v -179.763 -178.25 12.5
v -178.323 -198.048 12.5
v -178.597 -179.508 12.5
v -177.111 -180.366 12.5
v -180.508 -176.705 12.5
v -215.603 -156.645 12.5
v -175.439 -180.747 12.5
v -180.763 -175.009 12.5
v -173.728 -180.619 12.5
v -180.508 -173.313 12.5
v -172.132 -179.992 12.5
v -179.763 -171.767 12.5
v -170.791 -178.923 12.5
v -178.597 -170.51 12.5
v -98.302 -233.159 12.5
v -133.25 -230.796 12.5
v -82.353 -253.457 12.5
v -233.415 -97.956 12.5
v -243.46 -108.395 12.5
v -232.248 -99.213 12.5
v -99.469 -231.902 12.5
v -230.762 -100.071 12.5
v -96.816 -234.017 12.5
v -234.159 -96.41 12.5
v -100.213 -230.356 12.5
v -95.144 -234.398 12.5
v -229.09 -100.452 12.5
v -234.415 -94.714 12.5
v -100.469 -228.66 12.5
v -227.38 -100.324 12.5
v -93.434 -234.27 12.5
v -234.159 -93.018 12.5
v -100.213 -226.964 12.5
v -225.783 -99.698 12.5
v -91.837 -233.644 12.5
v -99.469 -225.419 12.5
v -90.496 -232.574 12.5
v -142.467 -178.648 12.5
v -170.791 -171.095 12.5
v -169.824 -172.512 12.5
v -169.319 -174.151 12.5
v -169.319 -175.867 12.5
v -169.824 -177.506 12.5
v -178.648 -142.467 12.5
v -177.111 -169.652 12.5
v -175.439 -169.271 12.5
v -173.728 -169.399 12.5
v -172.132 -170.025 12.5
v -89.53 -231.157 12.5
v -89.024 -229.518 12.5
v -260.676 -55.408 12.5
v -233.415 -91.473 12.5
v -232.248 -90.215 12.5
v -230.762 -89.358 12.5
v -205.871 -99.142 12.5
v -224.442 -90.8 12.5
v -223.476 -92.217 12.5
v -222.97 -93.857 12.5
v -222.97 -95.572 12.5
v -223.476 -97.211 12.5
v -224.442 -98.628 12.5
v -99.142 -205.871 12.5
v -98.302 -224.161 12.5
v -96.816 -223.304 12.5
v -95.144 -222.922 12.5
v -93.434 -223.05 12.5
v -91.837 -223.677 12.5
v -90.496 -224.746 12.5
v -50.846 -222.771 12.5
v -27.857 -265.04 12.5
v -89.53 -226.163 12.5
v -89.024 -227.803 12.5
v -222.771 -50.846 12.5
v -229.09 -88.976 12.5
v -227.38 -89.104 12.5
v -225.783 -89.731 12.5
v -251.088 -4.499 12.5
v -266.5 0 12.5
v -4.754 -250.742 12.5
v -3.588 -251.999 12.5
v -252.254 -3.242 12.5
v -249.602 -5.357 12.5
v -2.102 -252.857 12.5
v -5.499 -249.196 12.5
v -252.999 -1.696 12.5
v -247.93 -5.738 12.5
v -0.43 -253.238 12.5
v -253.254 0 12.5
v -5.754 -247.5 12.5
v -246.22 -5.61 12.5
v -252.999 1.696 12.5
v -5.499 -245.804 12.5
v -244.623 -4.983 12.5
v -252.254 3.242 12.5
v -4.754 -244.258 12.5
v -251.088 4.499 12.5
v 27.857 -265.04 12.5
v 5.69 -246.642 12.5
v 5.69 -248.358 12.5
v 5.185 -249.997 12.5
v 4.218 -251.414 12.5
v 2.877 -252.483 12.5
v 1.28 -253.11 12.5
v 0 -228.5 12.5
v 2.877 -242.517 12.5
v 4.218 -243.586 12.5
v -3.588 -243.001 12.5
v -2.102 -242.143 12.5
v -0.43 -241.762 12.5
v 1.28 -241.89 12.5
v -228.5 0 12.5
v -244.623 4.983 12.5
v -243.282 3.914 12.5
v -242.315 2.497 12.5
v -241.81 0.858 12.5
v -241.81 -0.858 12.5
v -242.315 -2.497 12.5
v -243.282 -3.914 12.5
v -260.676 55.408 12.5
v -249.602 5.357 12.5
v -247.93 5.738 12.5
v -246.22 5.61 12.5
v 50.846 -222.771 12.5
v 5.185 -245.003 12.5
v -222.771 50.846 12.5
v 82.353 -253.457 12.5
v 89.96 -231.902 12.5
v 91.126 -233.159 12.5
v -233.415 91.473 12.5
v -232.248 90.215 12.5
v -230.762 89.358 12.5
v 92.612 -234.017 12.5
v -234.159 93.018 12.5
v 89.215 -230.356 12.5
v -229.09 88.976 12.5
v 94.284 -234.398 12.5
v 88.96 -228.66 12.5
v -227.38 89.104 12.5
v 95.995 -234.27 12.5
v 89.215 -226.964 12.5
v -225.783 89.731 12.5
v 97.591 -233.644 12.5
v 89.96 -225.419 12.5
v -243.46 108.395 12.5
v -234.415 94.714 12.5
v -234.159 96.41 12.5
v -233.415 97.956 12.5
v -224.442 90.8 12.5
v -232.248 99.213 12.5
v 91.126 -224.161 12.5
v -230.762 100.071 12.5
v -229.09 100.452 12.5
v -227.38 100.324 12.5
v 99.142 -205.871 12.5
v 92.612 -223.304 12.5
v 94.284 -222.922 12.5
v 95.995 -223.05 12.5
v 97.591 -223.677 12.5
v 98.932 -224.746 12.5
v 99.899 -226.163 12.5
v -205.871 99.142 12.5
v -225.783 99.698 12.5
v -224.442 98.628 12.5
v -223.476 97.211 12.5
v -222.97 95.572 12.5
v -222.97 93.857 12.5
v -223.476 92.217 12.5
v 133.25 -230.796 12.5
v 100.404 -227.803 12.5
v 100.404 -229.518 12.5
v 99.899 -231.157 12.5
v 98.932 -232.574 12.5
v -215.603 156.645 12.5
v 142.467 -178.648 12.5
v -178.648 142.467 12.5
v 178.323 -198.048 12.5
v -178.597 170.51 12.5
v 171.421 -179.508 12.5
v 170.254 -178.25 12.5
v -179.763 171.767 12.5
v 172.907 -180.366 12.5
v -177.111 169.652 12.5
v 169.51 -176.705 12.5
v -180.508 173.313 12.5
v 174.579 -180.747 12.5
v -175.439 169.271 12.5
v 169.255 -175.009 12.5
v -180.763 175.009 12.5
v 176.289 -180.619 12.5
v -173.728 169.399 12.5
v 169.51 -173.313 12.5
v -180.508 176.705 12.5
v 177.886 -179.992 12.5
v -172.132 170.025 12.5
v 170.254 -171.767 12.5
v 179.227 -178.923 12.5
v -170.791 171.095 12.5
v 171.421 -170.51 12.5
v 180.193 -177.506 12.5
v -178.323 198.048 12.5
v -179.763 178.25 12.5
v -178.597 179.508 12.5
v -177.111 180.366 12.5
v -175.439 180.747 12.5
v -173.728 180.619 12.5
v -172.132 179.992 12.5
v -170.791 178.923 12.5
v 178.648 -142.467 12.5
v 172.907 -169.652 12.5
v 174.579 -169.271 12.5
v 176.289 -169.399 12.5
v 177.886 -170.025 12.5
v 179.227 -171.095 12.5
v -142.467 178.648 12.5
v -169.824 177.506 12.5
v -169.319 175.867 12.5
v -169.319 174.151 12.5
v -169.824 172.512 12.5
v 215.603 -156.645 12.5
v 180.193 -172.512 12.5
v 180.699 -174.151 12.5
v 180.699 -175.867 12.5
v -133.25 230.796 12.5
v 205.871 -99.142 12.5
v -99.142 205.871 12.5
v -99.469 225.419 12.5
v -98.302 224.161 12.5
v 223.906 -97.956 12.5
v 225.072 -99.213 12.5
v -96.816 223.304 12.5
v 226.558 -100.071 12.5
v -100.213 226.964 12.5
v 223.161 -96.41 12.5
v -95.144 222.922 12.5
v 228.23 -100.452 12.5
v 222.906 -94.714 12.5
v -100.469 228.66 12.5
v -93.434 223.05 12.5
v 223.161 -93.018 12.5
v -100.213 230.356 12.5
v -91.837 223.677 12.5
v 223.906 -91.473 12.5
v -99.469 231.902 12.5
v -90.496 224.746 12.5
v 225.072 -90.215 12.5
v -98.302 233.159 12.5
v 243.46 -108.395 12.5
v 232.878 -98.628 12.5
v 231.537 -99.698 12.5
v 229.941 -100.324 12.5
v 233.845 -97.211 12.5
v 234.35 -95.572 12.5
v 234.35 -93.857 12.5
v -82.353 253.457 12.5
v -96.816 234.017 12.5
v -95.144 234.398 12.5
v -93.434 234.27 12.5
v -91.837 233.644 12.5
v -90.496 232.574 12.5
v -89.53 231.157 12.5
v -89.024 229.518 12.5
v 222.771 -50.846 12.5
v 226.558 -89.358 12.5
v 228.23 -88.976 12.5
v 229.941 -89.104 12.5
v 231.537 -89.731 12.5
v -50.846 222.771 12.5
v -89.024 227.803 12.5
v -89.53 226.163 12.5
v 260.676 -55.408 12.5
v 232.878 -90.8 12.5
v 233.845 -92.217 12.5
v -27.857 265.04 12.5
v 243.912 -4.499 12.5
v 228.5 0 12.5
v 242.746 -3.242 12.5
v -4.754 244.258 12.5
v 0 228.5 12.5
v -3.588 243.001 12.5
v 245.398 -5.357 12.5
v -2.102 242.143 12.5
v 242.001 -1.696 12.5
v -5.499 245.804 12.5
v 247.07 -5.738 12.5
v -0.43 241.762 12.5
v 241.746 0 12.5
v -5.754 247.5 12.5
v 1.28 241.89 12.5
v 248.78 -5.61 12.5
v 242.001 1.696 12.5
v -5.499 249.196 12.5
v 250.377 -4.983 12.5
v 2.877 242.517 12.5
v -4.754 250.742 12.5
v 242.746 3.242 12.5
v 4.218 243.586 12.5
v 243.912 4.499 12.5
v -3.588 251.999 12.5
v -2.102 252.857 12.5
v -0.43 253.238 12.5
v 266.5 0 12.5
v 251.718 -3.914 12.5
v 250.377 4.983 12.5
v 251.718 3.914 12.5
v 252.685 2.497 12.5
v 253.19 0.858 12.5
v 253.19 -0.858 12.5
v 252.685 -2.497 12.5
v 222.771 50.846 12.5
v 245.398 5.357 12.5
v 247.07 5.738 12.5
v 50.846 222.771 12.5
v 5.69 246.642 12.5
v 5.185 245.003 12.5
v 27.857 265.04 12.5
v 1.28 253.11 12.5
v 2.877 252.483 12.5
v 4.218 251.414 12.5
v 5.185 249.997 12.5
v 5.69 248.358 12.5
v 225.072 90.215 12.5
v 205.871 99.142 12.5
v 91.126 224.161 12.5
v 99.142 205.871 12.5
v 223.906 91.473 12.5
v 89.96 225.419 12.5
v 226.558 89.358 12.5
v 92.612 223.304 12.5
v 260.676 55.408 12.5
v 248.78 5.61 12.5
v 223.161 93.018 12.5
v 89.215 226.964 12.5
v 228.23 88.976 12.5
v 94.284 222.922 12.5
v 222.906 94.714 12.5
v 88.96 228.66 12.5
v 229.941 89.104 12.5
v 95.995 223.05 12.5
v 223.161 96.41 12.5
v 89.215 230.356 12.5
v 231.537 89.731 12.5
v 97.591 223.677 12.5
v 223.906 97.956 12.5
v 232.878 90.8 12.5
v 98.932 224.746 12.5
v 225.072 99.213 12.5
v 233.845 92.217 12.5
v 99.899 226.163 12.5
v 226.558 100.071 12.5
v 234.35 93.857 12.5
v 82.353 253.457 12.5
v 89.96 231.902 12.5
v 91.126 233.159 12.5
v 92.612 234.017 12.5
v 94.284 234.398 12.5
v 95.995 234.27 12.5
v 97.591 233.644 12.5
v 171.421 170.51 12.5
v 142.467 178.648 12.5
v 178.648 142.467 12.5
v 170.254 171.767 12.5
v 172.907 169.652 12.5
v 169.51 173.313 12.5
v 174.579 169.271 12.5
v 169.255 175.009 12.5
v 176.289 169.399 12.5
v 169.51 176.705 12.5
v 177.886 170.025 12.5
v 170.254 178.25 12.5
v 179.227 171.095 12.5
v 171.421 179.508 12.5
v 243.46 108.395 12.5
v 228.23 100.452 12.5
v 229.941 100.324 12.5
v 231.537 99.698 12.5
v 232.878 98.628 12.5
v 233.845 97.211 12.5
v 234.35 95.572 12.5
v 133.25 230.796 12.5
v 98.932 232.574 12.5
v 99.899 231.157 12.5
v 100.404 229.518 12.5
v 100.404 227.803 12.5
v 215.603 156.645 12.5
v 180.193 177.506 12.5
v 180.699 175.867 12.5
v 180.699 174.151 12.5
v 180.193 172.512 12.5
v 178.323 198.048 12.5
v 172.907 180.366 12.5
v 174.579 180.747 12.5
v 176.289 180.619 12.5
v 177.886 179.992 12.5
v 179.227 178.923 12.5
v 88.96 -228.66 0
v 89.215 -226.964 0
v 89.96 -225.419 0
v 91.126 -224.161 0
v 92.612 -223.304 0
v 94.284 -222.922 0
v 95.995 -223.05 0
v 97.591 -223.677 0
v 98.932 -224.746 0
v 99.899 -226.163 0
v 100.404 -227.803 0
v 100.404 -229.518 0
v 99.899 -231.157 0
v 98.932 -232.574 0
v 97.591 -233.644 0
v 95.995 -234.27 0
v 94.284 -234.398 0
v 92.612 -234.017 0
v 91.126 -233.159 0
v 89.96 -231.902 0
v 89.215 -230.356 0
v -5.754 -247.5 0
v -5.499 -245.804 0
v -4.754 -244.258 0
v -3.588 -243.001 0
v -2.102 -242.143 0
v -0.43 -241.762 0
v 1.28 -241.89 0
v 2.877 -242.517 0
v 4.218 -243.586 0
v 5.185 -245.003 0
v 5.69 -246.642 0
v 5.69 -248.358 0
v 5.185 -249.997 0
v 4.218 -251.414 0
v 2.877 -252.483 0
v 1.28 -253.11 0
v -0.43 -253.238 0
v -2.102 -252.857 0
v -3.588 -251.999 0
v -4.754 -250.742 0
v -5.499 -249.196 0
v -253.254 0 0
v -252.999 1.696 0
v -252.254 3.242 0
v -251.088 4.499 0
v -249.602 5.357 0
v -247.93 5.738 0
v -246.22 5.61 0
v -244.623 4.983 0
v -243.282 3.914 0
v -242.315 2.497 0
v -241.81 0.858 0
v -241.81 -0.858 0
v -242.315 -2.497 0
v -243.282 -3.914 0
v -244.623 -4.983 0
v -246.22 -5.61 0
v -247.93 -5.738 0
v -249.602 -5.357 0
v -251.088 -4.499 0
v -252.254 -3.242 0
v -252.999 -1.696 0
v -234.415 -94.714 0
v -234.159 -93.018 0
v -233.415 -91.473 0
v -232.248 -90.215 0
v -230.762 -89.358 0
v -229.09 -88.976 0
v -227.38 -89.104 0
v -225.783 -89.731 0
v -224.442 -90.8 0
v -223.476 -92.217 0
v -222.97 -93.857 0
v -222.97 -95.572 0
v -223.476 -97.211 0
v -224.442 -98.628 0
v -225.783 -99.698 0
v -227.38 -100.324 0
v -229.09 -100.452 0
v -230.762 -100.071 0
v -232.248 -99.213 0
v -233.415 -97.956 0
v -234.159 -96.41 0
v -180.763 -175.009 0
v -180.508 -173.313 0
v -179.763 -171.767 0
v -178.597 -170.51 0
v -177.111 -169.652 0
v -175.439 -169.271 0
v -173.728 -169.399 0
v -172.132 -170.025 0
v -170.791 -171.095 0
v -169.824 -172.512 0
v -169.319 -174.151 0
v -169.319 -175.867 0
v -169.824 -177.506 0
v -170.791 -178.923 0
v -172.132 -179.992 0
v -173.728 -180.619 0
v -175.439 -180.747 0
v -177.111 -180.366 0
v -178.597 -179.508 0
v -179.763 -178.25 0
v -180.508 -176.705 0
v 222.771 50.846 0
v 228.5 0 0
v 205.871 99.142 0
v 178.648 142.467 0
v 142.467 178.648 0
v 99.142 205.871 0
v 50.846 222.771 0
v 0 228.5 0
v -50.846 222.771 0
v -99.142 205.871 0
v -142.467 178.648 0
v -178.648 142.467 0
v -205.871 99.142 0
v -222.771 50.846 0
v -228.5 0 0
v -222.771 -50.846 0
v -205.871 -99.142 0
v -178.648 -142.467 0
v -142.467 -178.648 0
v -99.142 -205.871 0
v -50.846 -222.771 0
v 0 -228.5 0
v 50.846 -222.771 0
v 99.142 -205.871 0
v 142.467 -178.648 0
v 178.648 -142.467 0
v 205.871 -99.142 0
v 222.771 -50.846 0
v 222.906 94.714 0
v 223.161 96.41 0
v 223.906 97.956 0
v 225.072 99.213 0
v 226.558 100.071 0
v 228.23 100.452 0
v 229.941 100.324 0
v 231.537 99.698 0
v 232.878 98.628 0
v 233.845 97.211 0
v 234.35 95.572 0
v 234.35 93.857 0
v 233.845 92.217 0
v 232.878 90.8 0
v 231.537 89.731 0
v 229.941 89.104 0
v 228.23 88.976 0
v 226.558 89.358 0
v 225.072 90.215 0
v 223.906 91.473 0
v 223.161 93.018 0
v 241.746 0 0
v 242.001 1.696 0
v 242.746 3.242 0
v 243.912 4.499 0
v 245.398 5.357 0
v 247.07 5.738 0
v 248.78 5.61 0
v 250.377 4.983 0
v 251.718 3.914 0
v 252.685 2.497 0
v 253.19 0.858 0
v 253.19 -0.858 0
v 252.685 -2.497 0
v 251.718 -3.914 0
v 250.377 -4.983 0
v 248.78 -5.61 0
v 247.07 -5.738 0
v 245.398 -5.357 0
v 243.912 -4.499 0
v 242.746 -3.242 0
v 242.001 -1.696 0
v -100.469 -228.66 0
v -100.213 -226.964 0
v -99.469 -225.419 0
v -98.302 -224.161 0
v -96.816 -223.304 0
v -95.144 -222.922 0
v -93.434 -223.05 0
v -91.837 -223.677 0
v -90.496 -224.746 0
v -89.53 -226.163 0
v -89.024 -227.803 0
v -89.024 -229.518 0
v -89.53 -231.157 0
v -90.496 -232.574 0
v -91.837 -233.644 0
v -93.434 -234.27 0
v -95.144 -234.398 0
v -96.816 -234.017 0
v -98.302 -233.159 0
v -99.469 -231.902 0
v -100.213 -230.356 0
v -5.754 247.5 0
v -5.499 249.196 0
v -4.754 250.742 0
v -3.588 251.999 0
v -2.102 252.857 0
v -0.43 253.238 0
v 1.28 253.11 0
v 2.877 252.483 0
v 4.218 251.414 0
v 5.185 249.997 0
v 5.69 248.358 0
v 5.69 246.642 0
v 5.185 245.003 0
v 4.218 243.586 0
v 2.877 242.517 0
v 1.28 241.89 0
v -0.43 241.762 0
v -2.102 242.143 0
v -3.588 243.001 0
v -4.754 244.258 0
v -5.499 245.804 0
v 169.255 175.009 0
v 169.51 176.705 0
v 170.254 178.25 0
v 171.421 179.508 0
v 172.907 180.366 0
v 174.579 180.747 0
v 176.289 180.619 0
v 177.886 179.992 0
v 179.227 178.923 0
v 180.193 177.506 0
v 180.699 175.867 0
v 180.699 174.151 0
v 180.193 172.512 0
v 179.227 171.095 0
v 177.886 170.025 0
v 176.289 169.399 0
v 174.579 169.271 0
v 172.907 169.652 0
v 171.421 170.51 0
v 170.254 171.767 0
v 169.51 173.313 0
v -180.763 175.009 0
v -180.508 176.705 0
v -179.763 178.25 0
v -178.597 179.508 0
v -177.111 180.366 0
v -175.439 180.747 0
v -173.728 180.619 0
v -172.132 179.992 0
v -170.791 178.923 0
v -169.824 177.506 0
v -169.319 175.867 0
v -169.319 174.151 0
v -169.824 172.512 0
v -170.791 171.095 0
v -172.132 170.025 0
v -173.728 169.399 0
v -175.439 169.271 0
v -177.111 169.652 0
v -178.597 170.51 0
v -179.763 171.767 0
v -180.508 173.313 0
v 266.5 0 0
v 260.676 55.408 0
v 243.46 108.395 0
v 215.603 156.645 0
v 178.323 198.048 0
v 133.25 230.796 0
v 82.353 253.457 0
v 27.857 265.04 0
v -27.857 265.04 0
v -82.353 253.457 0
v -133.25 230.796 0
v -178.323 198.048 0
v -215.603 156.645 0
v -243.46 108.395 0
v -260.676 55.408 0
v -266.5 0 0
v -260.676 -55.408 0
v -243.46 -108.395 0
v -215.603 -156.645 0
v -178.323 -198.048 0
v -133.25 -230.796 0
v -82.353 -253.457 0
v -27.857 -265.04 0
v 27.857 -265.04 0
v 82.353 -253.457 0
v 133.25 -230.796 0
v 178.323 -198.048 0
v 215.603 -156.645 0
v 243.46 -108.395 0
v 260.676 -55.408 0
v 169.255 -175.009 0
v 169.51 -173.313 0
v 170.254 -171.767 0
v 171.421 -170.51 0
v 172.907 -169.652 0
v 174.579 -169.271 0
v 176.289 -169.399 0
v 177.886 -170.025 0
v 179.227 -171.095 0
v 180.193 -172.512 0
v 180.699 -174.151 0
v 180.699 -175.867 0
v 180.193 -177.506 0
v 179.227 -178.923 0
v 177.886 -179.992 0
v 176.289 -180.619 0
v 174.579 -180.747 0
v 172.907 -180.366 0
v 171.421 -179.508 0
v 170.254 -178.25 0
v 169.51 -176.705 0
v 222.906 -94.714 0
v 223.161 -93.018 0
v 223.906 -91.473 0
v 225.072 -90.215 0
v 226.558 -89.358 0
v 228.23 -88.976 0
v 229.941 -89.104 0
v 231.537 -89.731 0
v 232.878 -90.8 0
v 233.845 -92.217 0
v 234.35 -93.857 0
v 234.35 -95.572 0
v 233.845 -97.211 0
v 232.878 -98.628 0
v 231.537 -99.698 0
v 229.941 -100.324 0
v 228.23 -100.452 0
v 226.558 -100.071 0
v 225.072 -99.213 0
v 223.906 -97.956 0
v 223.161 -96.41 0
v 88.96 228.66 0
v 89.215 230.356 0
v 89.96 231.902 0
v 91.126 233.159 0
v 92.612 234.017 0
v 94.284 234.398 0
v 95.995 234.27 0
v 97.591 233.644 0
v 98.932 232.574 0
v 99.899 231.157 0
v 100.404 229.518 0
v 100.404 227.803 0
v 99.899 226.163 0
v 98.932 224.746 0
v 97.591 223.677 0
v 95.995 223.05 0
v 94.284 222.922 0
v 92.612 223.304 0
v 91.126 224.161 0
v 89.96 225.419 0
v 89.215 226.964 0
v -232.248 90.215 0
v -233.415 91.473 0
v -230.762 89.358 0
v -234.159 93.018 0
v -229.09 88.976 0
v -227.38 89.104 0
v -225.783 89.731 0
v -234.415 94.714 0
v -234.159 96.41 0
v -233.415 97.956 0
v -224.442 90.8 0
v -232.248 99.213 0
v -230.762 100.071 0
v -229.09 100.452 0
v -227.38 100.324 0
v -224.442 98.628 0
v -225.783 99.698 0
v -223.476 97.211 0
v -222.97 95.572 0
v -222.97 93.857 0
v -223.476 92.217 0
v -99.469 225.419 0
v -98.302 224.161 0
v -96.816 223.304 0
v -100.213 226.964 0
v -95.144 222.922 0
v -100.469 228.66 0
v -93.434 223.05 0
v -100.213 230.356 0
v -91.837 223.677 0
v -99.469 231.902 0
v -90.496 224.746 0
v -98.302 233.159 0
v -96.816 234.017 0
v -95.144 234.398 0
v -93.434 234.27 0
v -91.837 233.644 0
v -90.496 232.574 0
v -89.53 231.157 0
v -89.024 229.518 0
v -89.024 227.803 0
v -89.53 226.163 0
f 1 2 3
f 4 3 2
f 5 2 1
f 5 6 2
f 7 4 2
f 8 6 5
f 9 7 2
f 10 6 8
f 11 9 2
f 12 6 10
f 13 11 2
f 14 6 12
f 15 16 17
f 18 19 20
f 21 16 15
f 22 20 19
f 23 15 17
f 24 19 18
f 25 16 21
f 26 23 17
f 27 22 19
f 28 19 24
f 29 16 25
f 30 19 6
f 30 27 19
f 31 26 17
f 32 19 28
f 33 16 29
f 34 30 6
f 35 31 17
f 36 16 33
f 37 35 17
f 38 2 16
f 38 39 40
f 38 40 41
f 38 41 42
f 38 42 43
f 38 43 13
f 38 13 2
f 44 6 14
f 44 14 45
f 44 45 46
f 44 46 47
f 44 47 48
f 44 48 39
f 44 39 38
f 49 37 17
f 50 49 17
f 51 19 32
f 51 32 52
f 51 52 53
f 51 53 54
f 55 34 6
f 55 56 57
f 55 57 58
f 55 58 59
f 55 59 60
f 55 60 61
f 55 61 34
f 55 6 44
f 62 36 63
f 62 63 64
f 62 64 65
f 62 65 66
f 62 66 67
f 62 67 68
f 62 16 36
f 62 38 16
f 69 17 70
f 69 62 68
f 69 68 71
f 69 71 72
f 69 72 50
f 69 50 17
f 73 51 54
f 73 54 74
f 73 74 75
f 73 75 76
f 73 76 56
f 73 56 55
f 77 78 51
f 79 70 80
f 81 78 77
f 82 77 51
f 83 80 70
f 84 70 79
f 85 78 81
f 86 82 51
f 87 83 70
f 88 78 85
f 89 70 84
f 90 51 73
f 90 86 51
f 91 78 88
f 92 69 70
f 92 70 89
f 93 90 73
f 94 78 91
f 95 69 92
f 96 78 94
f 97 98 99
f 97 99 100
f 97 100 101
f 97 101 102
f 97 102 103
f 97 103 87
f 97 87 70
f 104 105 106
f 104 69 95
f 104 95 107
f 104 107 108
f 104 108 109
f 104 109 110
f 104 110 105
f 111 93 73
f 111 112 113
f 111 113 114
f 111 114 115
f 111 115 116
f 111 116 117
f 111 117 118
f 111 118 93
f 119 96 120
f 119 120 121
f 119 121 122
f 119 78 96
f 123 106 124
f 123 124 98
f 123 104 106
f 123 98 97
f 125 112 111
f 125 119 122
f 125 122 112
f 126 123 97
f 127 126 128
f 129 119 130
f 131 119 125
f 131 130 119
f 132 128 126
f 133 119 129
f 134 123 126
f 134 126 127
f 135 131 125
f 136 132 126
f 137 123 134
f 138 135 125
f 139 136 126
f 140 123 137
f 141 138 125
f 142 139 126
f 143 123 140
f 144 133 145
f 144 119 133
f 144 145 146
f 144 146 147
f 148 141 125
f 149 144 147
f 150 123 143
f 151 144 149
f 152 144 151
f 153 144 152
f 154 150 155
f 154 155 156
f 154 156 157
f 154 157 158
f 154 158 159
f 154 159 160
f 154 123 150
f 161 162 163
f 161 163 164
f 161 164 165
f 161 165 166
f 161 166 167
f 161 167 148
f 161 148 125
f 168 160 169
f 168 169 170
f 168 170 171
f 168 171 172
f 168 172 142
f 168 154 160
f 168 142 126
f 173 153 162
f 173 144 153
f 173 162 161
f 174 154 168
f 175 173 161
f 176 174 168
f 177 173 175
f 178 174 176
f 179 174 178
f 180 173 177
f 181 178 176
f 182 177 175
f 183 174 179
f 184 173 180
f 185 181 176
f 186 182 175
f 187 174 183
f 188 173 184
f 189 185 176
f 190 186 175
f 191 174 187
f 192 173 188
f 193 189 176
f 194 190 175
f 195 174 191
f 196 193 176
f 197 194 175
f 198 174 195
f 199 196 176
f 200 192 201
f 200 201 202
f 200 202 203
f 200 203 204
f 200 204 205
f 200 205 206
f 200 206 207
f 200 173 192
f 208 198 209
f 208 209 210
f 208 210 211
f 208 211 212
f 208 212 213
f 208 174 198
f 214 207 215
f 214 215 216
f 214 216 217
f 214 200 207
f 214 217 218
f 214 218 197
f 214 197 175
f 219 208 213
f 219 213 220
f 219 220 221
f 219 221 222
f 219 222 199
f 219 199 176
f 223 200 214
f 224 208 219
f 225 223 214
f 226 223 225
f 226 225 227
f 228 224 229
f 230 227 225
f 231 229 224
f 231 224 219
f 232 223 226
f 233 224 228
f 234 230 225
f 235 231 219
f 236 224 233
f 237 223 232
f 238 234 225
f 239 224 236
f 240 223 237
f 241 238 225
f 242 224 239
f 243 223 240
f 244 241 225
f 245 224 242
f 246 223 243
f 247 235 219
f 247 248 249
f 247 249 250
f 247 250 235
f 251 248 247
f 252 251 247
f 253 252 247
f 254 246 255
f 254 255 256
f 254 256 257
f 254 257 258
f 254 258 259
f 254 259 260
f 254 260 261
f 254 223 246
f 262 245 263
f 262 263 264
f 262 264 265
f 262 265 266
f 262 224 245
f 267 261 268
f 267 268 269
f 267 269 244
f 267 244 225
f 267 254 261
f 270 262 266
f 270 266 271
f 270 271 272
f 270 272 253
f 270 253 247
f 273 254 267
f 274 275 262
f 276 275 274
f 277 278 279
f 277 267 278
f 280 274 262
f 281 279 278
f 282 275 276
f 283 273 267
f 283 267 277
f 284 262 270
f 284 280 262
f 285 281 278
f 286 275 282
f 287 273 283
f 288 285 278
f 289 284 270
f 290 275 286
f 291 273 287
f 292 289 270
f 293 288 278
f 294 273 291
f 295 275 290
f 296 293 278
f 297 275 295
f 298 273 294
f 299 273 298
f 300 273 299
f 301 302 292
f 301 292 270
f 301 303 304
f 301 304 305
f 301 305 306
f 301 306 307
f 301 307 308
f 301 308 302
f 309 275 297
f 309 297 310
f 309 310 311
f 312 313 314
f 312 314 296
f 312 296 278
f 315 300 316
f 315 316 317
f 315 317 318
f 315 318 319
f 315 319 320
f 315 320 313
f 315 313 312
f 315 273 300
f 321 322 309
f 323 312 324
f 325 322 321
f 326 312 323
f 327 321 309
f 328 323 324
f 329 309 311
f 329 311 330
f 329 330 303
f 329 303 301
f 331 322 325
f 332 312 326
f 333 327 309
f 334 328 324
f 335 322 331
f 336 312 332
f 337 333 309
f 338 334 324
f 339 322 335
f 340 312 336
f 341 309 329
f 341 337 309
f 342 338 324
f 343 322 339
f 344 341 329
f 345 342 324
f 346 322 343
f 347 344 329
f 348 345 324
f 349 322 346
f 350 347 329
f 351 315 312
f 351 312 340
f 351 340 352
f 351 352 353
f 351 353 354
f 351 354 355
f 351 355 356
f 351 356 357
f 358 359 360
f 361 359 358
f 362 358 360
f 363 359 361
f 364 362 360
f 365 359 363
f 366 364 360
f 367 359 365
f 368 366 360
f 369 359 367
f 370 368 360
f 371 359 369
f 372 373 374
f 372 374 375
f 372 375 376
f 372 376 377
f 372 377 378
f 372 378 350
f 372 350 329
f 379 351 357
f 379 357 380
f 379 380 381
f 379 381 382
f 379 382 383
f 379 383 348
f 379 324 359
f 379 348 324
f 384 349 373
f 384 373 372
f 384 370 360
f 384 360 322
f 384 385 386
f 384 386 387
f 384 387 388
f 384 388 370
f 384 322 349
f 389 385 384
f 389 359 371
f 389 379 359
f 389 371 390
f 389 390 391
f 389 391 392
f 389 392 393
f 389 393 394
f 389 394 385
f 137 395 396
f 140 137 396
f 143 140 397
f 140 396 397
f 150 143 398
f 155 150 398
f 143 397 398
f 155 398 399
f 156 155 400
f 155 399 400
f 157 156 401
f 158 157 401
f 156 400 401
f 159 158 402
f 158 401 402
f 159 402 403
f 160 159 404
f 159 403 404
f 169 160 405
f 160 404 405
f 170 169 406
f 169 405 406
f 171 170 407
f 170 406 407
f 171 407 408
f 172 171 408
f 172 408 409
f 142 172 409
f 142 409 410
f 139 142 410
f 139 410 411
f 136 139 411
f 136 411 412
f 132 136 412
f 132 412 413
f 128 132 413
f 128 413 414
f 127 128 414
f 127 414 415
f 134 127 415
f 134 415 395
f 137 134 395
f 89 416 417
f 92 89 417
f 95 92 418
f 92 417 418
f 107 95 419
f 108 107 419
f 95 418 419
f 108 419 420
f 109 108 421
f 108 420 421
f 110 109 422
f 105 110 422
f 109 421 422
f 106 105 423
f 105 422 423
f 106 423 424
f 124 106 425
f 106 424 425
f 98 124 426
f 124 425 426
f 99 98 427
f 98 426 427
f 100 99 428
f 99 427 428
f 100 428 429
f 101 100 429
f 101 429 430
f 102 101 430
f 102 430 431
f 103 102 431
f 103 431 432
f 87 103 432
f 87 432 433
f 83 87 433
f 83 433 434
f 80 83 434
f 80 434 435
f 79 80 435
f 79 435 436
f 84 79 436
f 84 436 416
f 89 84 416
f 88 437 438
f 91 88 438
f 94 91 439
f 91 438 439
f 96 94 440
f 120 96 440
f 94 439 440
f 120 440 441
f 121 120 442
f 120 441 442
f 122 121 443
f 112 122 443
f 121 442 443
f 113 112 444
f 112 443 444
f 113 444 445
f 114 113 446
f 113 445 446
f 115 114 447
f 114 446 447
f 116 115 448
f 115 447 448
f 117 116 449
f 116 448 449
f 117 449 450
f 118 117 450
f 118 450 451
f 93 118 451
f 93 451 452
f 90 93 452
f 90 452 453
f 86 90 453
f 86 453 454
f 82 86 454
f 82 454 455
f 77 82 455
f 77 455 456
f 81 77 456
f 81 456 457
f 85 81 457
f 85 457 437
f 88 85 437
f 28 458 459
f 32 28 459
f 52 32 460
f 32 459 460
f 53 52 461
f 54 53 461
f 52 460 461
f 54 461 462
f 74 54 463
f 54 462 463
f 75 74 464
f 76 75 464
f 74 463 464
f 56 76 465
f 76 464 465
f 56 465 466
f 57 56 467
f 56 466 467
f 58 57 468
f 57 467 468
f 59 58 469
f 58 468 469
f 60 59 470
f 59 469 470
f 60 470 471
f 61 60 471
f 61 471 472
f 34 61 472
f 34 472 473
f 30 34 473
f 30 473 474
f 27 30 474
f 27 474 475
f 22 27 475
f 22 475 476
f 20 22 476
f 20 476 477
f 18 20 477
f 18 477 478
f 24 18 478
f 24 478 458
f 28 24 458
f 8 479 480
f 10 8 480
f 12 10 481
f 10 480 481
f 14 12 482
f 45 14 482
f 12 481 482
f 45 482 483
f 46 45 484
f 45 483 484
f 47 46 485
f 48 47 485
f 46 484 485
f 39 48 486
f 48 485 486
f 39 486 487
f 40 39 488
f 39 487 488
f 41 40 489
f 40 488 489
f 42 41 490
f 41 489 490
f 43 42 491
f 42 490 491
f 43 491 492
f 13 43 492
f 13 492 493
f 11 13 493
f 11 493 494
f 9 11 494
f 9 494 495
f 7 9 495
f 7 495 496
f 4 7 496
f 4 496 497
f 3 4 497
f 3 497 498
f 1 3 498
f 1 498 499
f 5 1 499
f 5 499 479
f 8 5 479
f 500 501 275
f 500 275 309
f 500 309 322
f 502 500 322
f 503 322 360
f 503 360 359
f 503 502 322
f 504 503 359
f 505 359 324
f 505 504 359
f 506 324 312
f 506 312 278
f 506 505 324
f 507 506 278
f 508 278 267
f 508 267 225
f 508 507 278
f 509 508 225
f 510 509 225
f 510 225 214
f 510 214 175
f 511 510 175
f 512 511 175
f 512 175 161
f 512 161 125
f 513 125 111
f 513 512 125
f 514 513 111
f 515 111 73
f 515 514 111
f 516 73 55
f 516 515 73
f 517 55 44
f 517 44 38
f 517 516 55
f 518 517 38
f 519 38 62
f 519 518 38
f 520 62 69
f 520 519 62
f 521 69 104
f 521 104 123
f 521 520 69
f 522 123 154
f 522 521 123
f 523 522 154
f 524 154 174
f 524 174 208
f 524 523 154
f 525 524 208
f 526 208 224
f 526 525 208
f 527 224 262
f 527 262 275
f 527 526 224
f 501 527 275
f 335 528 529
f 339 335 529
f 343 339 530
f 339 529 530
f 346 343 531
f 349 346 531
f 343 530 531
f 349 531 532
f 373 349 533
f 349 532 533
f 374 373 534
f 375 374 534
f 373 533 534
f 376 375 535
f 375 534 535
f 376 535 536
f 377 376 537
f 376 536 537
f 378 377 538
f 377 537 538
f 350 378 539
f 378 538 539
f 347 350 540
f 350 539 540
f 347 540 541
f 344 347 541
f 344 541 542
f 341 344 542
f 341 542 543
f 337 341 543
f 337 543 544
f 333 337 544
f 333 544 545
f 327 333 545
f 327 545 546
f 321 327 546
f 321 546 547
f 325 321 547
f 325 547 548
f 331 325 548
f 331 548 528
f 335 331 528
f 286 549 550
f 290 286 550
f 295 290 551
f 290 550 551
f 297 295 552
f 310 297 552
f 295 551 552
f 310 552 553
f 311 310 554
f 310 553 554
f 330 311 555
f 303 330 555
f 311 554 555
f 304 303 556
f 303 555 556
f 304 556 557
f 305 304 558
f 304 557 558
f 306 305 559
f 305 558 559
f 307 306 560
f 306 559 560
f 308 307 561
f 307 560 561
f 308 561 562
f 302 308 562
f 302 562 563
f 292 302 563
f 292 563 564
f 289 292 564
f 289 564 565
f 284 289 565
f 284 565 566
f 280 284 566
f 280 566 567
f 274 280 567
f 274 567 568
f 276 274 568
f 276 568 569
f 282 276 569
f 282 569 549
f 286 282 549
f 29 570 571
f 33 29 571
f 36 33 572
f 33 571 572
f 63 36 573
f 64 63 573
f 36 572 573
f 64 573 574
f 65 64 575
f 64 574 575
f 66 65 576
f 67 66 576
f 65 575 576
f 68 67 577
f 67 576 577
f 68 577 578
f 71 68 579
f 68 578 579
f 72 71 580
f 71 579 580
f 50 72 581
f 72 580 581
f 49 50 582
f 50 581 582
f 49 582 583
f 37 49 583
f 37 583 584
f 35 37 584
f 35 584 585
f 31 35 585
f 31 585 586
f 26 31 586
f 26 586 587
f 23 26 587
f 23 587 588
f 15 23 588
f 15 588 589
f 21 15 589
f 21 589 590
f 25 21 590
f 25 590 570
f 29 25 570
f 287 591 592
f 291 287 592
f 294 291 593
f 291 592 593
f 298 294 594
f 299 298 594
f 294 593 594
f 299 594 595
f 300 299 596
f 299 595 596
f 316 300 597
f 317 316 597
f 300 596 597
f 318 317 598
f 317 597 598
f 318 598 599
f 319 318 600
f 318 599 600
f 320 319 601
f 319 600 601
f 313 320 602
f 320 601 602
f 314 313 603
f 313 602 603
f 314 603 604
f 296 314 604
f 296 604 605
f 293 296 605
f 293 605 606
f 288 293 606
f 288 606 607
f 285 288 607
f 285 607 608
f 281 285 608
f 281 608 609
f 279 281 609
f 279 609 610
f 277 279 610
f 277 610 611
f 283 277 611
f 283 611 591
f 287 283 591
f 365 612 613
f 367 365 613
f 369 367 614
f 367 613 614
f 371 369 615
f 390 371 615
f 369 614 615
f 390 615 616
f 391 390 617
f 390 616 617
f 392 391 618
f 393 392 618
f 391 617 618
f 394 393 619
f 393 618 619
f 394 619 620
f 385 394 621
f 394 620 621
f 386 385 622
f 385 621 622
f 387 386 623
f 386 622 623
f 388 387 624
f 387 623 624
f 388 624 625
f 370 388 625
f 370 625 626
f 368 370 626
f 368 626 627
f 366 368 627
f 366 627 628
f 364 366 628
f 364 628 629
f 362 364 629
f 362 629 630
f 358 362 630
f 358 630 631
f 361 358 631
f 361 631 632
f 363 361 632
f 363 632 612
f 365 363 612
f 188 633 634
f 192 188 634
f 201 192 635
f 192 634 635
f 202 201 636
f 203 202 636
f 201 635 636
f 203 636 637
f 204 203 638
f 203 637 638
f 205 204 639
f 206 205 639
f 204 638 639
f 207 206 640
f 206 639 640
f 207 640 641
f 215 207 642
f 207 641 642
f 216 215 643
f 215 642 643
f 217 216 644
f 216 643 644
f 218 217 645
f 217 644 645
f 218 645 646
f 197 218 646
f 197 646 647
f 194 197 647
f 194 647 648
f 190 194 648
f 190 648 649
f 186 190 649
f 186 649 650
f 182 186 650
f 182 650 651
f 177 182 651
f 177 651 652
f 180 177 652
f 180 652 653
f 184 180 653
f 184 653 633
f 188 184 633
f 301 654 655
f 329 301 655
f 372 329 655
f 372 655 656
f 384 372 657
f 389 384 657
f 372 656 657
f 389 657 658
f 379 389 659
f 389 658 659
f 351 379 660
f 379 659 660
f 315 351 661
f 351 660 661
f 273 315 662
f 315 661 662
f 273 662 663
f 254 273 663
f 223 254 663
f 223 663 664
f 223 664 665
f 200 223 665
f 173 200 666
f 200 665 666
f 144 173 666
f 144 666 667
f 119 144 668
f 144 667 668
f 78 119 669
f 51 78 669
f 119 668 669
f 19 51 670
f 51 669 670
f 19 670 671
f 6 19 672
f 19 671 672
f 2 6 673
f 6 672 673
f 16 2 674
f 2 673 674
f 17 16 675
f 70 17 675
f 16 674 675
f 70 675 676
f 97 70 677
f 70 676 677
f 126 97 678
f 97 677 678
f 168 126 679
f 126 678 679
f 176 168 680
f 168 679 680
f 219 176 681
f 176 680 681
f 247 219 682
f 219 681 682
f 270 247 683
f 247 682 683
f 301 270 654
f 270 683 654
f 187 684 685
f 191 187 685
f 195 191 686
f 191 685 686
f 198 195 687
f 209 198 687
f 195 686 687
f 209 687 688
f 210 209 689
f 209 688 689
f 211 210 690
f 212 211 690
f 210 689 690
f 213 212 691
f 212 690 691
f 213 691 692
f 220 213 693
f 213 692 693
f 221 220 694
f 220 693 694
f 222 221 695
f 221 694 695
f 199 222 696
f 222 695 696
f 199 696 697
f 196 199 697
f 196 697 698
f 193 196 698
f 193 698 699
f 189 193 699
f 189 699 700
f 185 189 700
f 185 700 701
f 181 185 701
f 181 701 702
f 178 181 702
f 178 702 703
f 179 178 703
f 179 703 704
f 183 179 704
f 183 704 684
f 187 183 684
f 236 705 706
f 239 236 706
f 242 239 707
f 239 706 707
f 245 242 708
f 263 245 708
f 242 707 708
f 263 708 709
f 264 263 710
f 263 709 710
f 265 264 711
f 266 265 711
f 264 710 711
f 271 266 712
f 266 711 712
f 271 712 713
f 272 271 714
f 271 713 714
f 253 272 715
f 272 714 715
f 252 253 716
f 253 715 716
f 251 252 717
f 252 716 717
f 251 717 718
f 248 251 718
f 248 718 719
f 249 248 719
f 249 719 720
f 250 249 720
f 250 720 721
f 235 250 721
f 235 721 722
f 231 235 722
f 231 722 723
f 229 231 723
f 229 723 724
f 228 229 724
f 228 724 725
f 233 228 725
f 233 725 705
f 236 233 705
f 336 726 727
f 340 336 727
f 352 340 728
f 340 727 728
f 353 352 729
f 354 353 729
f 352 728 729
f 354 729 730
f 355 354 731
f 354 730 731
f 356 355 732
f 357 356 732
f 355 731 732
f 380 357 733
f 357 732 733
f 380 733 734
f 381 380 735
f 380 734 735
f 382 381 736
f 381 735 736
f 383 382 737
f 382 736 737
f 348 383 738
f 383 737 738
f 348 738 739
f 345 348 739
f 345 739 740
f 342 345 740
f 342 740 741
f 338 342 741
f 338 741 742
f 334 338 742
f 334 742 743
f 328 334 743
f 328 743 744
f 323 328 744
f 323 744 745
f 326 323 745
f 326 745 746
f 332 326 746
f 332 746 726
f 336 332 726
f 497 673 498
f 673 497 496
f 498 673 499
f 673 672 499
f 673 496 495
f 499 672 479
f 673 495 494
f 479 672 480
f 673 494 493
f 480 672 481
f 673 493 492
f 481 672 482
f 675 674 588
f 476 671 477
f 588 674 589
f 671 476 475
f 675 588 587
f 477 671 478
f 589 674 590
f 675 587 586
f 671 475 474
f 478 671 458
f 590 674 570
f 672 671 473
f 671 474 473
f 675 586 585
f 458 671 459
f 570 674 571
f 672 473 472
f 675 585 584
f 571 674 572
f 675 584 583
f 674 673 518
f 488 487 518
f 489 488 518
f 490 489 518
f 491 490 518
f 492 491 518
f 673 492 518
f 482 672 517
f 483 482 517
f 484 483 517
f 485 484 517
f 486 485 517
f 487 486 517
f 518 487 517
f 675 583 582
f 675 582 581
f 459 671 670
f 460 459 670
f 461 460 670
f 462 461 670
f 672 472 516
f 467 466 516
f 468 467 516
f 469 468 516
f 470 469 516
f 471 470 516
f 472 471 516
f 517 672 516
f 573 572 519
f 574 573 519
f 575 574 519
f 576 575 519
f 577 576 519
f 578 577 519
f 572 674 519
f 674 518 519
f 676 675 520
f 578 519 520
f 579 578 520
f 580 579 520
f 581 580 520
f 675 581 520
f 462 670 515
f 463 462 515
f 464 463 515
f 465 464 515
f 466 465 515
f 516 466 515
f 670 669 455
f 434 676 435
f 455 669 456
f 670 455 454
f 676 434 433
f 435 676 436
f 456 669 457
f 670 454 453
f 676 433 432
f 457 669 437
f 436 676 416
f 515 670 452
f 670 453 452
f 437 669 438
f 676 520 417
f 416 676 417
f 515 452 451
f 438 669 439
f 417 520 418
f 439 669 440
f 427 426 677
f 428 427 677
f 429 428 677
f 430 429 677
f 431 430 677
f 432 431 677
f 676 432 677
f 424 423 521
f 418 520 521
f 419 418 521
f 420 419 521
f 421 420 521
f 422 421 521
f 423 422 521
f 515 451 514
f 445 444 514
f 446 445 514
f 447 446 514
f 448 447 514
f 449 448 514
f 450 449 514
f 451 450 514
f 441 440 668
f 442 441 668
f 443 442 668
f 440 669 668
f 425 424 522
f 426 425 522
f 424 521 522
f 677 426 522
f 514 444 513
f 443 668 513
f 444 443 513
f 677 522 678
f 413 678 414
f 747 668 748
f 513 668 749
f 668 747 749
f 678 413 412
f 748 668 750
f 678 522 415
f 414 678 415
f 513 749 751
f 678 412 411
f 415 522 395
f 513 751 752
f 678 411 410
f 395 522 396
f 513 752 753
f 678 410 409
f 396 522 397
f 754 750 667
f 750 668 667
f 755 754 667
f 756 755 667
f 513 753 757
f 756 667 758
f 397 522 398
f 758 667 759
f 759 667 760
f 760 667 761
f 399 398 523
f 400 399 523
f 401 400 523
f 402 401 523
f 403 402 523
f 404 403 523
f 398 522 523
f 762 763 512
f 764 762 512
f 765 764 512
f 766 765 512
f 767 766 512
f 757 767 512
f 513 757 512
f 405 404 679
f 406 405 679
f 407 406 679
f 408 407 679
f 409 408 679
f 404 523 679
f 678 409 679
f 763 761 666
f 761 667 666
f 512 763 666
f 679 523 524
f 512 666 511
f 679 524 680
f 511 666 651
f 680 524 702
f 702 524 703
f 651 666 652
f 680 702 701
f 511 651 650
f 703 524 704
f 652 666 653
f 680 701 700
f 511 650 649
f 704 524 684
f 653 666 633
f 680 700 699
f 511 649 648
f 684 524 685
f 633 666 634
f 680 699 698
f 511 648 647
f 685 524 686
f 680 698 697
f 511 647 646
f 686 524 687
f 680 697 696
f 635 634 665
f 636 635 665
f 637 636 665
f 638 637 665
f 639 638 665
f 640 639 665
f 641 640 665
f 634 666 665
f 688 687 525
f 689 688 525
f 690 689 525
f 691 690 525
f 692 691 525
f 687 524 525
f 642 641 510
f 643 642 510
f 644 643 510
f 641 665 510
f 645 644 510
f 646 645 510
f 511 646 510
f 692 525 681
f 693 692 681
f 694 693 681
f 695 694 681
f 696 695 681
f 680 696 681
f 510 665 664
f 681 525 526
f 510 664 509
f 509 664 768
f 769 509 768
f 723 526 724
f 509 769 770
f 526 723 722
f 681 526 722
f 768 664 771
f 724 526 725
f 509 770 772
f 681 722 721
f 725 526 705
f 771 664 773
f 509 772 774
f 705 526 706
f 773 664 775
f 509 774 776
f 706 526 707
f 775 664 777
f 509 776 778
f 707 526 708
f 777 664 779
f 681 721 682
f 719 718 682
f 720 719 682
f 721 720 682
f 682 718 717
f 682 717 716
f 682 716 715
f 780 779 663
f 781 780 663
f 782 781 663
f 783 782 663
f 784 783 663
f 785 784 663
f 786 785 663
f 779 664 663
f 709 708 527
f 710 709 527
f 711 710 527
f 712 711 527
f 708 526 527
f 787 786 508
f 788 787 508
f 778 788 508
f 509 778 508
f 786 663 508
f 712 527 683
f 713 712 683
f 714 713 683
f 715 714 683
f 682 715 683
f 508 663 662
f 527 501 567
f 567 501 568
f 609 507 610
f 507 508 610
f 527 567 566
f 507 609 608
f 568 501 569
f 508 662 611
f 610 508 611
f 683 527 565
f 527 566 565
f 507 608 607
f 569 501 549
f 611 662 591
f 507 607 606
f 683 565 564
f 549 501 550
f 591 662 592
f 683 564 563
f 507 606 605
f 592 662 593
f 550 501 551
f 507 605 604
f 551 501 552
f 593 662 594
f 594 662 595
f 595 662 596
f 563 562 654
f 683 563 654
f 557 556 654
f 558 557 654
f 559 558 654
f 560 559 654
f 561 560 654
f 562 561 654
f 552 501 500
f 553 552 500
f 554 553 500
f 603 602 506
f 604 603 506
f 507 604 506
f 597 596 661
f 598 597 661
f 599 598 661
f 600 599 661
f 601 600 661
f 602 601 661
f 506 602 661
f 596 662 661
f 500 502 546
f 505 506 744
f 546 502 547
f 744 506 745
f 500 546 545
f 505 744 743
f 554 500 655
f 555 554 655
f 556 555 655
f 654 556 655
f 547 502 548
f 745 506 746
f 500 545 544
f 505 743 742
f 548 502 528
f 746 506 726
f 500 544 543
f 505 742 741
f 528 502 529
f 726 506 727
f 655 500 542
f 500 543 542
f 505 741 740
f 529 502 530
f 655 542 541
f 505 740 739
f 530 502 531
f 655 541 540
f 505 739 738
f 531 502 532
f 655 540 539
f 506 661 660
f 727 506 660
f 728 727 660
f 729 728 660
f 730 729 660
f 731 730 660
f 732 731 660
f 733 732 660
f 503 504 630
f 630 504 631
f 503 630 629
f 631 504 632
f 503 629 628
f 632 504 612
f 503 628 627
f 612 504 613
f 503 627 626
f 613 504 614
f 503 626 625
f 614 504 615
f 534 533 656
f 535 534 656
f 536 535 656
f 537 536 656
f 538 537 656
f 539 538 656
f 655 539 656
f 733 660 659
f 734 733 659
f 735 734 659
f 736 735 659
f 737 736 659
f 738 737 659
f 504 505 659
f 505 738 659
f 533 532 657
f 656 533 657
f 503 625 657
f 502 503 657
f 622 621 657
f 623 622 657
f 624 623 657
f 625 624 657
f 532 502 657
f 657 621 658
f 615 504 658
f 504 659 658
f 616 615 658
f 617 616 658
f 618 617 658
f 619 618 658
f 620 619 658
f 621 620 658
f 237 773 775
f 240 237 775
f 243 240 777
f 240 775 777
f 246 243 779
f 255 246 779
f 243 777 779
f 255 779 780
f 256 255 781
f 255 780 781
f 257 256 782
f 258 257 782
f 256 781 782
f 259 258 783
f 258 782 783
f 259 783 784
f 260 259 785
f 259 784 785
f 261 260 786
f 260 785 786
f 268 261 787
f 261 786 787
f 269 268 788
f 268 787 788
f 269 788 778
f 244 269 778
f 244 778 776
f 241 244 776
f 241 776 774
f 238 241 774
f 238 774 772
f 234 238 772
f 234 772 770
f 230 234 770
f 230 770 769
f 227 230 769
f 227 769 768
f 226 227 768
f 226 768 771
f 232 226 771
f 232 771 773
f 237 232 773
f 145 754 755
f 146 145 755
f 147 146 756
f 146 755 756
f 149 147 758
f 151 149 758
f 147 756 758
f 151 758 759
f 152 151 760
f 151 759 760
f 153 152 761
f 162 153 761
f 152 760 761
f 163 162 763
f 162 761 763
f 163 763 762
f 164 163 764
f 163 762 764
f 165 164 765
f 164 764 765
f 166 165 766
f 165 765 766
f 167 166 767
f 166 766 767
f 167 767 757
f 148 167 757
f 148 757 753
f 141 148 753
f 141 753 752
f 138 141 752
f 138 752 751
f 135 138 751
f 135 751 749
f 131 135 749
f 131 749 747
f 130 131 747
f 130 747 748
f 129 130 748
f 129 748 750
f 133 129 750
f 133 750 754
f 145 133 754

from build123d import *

# Parameters (mm, degrees)
F0_R     = 266.5
F0_R_2   = 228.5
F1_DEPTH = 12.5
F3_D     = 11.50874


with BuildPart() as f1:
    # F0 (on Top) → F1 (new body)
    with BuildSketch(Plane.XY):
        Circle(F0_R)
        Circle(F0_R_2, mode=Mode.SUBTRACT)
    extrude(amount=F1_DEPTH)

    # F3 (through all)
    with Locations(Plane.XY.offset(12.5)):
        with Locations((-94.7141495104, 228.6601842965), (0, 247.5), (94.7141495104, 228.6601842965), (175.0089283437, 175.0089283437), (228.6601842965, 94.7141495104), (247.5, 0), (228.6601842965, -94.7141495104), (175.0089283437, -175.0089283437), (94.7141495104, -228.6601842965), (0, -247.5), (-94.7141495104, -228.6601842965), (-175.0089283437, -175.0089283437), (-228.6601842965, -94.7141495104), (-247.5, 0), (-228.6601842965, 94.7141495104), (-175.0089283437, 175.0089283437)):
            Hole(F3_D / 2)


solid = f1.part
